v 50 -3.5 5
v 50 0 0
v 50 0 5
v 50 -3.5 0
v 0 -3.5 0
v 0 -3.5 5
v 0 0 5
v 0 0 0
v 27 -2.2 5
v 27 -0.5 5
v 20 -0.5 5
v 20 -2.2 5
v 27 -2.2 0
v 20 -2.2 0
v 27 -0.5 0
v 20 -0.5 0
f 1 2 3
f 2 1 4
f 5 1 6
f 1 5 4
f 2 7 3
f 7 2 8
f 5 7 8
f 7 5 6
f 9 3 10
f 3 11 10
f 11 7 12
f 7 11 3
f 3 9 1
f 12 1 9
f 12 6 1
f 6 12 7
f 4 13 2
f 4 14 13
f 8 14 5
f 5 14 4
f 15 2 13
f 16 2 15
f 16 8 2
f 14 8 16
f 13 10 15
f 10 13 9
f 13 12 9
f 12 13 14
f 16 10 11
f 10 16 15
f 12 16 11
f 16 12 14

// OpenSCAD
rotate([90,0,0]) difference() {
	cube([50, 5, 3.5]);
	translate([20,-2, 0.5]) cube([7, 10, 1.7]);
};
